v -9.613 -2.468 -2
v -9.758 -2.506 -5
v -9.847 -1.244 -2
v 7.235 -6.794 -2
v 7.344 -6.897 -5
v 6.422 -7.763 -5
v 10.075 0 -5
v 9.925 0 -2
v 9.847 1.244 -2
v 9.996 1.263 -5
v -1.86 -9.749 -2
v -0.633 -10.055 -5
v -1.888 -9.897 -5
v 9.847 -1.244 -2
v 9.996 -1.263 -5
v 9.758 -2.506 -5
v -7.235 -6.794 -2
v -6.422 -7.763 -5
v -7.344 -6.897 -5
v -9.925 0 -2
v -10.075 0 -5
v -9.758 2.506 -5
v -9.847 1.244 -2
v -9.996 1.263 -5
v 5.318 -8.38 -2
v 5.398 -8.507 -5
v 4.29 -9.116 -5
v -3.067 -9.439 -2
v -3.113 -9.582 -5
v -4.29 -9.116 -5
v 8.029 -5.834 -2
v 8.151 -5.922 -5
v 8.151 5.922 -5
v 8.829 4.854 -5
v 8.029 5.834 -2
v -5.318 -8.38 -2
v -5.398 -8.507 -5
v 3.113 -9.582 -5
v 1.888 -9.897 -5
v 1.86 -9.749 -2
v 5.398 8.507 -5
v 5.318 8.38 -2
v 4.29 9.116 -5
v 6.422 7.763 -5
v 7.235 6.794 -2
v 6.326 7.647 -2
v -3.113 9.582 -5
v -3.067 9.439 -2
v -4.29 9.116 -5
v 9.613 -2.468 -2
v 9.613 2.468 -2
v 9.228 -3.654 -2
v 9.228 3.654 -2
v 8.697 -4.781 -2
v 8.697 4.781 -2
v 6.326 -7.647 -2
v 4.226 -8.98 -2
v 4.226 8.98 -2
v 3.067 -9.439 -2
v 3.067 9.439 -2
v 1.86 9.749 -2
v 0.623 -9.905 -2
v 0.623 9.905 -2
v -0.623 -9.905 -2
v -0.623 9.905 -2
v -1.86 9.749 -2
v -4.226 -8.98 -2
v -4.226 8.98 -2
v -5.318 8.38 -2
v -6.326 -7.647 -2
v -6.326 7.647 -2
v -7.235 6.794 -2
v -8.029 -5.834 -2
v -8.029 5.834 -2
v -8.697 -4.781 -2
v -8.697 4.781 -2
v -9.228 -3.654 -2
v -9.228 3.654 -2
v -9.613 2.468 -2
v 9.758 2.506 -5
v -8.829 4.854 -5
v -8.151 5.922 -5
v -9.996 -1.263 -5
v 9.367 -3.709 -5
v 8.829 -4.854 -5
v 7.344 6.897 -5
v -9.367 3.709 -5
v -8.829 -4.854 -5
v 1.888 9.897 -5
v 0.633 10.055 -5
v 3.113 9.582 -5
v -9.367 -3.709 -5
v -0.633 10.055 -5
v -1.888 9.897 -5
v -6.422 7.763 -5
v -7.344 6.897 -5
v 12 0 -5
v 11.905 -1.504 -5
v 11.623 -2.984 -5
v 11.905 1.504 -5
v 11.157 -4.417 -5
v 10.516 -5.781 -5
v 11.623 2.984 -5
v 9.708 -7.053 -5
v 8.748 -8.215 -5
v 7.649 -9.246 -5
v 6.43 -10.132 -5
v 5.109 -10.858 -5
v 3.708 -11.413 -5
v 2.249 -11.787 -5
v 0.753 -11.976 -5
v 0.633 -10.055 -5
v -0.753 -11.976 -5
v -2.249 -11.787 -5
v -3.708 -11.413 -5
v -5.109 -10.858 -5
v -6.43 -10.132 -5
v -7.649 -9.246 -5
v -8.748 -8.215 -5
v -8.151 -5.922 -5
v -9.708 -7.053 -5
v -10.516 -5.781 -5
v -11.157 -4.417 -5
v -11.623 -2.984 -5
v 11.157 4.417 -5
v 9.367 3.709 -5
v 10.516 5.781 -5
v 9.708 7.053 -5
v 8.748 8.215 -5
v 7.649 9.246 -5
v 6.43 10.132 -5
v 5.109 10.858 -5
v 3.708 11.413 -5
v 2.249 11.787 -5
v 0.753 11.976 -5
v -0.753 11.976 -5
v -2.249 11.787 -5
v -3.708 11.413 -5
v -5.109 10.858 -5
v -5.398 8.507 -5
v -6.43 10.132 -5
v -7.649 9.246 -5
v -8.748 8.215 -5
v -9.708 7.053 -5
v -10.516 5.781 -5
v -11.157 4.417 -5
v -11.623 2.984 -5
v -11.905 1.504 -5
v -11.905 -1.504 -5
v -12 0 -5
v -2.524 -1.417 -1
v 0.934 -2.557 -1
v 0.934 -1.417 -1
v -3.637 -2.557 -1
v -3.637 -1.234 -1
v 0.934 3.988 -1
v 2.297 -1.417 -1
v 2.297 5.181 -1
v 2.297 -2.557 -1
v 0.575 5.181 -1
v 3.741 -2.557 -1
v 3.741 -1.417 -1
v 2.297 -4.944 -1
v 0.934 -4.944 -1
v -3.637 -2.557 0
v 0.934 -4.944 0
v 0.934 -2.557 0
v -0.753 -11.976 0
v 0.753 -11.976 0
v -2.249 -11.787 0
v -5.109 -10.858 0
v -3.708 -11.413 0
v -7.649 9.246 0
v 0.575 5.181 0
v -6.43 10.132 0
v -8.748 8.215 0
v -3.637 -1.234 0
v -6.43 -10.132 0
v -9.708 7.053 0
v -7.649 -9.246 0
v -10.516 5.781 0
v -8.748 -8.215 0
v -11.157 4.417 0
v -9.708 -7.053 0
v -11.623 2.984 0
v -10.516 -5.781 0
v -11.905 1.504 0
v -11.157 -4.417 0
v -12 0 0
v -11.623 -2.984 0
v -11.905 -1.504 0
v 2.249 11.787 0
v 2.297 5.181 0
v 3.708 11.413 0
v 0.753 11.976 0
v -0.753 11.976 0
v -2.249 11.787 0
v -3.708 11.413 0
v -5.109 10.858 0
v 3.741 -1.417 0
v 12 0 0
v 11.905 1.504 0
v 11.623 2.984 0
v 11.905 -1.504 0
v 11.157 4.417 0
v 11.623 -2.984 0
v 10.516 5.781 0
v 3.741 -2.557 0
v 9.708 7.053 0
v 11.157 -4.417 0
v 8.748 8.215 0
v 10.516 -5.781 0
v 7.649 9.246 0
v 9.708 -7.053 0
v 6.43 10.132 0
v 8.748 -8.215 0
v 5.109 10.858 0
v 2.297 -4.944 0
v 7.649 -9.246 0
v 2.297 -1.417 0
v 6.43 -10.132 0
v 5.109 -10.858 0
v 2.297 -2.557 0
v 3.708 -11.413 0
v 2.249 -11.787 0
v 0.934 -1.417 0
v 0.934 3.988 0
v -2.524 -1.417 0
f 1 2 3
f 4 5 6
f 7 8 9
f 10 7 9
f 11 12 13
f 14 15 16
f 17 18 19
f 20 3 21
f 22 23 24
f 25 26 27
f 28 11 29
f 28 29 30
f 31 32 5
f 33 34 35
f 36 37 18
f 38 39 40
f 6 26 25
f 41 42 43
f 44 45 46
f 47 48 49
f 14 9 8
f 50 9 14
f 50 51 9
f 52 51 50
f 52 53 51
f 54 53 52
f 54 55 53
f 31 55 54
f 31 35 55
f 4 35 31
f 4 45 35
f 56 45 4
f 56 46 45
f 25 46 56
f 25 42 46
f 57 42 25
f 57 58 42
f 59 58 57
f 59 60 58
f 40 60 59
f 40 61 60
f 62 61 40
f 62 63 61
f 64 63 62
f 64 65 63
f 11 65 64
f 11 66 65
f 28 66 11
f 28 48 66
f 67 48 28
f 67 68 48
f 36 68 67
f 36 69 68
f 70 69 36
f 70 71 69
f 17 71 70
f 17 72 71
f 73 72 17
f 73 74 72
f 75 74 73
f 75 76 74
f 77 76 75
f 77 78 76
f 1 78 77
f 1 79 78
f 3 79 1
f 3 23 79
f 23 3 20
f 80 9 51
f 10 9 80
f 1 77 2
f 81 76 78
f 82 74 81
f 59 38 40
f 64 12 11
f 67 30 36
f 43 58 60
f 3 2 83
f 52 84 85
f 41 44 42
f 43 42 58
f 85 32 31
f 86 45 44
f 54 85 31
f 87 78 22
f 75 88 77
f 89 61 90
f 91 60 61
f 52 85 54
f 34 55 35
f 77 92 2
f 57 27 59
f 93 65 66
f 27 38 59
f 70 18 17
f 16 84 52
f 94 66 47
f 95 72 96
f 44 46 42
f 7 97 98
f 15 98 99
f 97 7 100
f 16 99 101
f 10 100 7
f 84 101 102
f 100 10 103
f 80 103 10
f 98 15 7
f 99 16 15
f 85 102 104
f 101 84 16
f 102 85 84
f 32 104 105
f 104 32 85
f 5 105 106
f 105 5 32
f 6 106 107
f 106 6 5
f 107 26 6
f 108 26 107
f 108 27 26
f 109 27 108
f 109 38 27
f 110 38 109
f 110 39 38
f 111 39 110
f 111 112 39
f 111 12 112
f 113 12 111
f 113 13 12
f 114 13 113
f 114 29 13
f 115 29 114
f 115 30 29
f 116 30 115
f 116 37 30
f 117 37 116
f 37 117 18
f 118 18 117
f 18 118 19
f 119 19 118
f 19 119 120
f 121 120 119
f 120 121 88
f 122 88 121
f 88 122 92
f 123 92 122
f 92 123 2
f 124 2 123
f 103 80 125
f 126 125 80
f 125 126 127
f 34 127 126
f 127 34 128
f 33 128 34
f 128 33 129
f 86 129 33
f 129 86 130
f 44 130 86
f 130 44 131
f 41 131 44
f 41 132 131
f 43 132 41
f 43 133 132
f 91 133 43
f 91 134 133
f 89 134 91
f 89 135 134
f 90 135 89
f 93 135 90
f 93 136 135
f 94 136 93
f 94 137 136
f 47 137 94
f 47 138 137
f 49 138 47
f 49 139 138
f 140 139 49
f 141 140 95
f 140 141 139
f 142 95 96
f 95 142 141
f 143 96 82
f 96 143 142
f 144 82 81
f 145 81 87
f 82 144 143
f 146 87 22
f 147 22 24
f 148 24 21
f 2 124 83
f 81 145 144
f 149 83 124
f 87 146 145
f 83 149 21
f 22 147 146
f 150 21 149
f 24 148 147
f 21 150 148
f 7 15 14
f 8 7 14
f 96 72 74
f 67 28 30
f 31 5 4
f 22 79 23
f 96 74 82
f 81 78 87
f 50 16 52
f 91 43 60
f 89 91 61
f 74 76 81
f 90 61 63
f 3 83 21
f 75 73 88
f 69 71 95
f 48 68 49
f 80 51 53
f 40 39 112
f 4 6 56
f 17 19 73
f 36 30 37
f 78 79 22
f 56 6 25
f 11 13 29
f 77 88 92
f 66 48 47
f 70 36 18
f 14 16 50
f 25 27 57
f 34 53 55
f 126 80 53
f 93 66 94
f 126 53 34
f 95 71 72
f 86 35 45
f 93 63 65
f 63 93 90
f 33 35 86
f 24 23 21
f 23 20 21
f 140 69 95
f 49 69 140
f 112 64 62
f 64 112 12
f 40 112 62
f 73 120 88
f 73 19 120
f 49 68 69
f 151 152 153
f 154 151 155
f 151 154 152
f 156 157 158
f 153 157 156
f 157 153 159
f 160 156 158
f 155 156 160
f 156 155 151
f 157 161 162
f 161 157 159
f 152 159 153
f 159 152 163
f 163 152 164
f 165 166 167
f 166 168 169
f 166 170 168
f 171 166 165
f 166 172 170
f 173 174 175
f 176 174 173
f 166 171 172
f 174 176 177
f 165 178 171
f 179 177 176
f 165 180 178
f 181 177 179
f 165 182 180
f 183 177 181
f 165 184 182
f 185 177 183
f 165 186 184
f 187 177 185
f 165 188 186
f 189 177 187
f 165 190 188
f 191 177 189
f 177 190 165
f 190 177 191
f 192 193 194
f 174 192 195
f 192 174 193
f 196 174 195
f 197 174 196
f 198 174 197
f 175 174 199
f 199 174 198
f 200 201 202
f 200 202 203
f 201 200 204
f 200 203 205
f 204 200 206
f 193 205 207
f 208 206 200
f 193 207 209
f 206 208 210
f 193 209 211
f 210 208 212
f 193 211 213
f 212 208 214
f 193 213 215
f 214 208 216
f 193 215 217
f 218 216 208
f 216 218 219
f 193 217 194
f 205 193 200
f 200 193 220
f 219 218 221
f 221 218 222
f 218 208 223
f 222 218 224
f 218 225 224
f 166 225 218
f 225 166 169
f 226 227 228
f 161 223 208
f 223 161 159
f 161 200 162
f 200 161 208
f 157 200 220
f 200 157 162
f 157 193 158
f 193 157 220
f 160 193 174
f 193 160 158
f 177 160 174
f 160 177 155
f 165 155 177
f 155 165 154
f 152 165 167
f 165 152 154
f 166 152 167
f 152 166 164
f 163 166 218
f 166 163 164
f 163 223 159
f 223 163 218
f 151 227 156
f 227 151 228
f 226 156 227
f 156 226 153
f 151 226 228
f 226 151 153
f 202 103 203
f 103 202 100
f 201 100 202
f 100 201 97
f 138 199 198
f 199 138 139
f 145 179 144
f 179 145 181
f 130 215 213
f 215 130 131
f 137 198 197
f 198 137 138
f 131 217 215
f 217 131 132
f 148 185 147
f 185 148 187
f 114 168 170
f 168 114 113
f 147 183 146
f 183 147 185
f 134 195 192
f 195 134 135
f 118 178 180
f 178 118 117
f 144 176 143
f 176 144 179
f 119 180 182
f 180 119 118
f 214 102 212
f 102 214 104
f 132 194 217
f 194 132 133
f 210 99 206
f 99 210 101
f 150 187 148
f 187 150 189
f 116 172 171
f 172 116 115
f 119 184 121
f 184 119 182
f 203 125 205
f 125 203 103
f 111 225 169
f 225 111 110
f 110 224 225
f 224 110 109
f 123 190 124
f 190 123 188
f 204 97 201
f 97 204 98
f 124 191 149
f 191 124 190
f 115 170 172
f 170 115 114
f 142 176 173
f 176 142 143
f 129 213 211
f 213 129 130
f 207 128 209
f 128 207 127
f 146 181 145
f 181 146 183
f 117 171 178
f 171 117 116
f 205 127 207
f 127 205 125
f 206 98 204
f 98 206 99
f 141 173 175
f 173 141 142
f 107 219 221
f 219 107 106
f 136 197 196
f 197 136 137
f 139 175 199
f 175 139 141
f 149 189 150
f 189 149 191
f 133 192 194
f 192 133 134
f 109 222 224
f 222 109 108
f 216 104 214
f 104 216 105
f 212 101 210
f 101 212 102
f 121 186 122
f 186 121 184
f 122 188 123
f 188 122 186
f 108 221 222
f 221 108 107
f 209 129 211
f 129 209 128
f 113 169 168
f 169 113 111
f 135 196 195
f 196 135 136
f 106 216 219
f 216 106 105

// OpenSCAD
$fn = 50;

difference() {
	union() {
		translate(v = [0, 0, -5.0]) {
			cylinder(h = 5, r = 12.0);
		}
	}
	union() {
		#translate(v = [0, 0, -5.0]) {
			cylinder(h = 3, r1 = 10.075, r2 = 9.925);
		}
		translate(v = [0, 0, -1]) {
			linear_extrude(height = 1) {
				text(font = "Impact", halign = "center", size = 10, text = "4", valign = "center");
			}
		}
	}
}
